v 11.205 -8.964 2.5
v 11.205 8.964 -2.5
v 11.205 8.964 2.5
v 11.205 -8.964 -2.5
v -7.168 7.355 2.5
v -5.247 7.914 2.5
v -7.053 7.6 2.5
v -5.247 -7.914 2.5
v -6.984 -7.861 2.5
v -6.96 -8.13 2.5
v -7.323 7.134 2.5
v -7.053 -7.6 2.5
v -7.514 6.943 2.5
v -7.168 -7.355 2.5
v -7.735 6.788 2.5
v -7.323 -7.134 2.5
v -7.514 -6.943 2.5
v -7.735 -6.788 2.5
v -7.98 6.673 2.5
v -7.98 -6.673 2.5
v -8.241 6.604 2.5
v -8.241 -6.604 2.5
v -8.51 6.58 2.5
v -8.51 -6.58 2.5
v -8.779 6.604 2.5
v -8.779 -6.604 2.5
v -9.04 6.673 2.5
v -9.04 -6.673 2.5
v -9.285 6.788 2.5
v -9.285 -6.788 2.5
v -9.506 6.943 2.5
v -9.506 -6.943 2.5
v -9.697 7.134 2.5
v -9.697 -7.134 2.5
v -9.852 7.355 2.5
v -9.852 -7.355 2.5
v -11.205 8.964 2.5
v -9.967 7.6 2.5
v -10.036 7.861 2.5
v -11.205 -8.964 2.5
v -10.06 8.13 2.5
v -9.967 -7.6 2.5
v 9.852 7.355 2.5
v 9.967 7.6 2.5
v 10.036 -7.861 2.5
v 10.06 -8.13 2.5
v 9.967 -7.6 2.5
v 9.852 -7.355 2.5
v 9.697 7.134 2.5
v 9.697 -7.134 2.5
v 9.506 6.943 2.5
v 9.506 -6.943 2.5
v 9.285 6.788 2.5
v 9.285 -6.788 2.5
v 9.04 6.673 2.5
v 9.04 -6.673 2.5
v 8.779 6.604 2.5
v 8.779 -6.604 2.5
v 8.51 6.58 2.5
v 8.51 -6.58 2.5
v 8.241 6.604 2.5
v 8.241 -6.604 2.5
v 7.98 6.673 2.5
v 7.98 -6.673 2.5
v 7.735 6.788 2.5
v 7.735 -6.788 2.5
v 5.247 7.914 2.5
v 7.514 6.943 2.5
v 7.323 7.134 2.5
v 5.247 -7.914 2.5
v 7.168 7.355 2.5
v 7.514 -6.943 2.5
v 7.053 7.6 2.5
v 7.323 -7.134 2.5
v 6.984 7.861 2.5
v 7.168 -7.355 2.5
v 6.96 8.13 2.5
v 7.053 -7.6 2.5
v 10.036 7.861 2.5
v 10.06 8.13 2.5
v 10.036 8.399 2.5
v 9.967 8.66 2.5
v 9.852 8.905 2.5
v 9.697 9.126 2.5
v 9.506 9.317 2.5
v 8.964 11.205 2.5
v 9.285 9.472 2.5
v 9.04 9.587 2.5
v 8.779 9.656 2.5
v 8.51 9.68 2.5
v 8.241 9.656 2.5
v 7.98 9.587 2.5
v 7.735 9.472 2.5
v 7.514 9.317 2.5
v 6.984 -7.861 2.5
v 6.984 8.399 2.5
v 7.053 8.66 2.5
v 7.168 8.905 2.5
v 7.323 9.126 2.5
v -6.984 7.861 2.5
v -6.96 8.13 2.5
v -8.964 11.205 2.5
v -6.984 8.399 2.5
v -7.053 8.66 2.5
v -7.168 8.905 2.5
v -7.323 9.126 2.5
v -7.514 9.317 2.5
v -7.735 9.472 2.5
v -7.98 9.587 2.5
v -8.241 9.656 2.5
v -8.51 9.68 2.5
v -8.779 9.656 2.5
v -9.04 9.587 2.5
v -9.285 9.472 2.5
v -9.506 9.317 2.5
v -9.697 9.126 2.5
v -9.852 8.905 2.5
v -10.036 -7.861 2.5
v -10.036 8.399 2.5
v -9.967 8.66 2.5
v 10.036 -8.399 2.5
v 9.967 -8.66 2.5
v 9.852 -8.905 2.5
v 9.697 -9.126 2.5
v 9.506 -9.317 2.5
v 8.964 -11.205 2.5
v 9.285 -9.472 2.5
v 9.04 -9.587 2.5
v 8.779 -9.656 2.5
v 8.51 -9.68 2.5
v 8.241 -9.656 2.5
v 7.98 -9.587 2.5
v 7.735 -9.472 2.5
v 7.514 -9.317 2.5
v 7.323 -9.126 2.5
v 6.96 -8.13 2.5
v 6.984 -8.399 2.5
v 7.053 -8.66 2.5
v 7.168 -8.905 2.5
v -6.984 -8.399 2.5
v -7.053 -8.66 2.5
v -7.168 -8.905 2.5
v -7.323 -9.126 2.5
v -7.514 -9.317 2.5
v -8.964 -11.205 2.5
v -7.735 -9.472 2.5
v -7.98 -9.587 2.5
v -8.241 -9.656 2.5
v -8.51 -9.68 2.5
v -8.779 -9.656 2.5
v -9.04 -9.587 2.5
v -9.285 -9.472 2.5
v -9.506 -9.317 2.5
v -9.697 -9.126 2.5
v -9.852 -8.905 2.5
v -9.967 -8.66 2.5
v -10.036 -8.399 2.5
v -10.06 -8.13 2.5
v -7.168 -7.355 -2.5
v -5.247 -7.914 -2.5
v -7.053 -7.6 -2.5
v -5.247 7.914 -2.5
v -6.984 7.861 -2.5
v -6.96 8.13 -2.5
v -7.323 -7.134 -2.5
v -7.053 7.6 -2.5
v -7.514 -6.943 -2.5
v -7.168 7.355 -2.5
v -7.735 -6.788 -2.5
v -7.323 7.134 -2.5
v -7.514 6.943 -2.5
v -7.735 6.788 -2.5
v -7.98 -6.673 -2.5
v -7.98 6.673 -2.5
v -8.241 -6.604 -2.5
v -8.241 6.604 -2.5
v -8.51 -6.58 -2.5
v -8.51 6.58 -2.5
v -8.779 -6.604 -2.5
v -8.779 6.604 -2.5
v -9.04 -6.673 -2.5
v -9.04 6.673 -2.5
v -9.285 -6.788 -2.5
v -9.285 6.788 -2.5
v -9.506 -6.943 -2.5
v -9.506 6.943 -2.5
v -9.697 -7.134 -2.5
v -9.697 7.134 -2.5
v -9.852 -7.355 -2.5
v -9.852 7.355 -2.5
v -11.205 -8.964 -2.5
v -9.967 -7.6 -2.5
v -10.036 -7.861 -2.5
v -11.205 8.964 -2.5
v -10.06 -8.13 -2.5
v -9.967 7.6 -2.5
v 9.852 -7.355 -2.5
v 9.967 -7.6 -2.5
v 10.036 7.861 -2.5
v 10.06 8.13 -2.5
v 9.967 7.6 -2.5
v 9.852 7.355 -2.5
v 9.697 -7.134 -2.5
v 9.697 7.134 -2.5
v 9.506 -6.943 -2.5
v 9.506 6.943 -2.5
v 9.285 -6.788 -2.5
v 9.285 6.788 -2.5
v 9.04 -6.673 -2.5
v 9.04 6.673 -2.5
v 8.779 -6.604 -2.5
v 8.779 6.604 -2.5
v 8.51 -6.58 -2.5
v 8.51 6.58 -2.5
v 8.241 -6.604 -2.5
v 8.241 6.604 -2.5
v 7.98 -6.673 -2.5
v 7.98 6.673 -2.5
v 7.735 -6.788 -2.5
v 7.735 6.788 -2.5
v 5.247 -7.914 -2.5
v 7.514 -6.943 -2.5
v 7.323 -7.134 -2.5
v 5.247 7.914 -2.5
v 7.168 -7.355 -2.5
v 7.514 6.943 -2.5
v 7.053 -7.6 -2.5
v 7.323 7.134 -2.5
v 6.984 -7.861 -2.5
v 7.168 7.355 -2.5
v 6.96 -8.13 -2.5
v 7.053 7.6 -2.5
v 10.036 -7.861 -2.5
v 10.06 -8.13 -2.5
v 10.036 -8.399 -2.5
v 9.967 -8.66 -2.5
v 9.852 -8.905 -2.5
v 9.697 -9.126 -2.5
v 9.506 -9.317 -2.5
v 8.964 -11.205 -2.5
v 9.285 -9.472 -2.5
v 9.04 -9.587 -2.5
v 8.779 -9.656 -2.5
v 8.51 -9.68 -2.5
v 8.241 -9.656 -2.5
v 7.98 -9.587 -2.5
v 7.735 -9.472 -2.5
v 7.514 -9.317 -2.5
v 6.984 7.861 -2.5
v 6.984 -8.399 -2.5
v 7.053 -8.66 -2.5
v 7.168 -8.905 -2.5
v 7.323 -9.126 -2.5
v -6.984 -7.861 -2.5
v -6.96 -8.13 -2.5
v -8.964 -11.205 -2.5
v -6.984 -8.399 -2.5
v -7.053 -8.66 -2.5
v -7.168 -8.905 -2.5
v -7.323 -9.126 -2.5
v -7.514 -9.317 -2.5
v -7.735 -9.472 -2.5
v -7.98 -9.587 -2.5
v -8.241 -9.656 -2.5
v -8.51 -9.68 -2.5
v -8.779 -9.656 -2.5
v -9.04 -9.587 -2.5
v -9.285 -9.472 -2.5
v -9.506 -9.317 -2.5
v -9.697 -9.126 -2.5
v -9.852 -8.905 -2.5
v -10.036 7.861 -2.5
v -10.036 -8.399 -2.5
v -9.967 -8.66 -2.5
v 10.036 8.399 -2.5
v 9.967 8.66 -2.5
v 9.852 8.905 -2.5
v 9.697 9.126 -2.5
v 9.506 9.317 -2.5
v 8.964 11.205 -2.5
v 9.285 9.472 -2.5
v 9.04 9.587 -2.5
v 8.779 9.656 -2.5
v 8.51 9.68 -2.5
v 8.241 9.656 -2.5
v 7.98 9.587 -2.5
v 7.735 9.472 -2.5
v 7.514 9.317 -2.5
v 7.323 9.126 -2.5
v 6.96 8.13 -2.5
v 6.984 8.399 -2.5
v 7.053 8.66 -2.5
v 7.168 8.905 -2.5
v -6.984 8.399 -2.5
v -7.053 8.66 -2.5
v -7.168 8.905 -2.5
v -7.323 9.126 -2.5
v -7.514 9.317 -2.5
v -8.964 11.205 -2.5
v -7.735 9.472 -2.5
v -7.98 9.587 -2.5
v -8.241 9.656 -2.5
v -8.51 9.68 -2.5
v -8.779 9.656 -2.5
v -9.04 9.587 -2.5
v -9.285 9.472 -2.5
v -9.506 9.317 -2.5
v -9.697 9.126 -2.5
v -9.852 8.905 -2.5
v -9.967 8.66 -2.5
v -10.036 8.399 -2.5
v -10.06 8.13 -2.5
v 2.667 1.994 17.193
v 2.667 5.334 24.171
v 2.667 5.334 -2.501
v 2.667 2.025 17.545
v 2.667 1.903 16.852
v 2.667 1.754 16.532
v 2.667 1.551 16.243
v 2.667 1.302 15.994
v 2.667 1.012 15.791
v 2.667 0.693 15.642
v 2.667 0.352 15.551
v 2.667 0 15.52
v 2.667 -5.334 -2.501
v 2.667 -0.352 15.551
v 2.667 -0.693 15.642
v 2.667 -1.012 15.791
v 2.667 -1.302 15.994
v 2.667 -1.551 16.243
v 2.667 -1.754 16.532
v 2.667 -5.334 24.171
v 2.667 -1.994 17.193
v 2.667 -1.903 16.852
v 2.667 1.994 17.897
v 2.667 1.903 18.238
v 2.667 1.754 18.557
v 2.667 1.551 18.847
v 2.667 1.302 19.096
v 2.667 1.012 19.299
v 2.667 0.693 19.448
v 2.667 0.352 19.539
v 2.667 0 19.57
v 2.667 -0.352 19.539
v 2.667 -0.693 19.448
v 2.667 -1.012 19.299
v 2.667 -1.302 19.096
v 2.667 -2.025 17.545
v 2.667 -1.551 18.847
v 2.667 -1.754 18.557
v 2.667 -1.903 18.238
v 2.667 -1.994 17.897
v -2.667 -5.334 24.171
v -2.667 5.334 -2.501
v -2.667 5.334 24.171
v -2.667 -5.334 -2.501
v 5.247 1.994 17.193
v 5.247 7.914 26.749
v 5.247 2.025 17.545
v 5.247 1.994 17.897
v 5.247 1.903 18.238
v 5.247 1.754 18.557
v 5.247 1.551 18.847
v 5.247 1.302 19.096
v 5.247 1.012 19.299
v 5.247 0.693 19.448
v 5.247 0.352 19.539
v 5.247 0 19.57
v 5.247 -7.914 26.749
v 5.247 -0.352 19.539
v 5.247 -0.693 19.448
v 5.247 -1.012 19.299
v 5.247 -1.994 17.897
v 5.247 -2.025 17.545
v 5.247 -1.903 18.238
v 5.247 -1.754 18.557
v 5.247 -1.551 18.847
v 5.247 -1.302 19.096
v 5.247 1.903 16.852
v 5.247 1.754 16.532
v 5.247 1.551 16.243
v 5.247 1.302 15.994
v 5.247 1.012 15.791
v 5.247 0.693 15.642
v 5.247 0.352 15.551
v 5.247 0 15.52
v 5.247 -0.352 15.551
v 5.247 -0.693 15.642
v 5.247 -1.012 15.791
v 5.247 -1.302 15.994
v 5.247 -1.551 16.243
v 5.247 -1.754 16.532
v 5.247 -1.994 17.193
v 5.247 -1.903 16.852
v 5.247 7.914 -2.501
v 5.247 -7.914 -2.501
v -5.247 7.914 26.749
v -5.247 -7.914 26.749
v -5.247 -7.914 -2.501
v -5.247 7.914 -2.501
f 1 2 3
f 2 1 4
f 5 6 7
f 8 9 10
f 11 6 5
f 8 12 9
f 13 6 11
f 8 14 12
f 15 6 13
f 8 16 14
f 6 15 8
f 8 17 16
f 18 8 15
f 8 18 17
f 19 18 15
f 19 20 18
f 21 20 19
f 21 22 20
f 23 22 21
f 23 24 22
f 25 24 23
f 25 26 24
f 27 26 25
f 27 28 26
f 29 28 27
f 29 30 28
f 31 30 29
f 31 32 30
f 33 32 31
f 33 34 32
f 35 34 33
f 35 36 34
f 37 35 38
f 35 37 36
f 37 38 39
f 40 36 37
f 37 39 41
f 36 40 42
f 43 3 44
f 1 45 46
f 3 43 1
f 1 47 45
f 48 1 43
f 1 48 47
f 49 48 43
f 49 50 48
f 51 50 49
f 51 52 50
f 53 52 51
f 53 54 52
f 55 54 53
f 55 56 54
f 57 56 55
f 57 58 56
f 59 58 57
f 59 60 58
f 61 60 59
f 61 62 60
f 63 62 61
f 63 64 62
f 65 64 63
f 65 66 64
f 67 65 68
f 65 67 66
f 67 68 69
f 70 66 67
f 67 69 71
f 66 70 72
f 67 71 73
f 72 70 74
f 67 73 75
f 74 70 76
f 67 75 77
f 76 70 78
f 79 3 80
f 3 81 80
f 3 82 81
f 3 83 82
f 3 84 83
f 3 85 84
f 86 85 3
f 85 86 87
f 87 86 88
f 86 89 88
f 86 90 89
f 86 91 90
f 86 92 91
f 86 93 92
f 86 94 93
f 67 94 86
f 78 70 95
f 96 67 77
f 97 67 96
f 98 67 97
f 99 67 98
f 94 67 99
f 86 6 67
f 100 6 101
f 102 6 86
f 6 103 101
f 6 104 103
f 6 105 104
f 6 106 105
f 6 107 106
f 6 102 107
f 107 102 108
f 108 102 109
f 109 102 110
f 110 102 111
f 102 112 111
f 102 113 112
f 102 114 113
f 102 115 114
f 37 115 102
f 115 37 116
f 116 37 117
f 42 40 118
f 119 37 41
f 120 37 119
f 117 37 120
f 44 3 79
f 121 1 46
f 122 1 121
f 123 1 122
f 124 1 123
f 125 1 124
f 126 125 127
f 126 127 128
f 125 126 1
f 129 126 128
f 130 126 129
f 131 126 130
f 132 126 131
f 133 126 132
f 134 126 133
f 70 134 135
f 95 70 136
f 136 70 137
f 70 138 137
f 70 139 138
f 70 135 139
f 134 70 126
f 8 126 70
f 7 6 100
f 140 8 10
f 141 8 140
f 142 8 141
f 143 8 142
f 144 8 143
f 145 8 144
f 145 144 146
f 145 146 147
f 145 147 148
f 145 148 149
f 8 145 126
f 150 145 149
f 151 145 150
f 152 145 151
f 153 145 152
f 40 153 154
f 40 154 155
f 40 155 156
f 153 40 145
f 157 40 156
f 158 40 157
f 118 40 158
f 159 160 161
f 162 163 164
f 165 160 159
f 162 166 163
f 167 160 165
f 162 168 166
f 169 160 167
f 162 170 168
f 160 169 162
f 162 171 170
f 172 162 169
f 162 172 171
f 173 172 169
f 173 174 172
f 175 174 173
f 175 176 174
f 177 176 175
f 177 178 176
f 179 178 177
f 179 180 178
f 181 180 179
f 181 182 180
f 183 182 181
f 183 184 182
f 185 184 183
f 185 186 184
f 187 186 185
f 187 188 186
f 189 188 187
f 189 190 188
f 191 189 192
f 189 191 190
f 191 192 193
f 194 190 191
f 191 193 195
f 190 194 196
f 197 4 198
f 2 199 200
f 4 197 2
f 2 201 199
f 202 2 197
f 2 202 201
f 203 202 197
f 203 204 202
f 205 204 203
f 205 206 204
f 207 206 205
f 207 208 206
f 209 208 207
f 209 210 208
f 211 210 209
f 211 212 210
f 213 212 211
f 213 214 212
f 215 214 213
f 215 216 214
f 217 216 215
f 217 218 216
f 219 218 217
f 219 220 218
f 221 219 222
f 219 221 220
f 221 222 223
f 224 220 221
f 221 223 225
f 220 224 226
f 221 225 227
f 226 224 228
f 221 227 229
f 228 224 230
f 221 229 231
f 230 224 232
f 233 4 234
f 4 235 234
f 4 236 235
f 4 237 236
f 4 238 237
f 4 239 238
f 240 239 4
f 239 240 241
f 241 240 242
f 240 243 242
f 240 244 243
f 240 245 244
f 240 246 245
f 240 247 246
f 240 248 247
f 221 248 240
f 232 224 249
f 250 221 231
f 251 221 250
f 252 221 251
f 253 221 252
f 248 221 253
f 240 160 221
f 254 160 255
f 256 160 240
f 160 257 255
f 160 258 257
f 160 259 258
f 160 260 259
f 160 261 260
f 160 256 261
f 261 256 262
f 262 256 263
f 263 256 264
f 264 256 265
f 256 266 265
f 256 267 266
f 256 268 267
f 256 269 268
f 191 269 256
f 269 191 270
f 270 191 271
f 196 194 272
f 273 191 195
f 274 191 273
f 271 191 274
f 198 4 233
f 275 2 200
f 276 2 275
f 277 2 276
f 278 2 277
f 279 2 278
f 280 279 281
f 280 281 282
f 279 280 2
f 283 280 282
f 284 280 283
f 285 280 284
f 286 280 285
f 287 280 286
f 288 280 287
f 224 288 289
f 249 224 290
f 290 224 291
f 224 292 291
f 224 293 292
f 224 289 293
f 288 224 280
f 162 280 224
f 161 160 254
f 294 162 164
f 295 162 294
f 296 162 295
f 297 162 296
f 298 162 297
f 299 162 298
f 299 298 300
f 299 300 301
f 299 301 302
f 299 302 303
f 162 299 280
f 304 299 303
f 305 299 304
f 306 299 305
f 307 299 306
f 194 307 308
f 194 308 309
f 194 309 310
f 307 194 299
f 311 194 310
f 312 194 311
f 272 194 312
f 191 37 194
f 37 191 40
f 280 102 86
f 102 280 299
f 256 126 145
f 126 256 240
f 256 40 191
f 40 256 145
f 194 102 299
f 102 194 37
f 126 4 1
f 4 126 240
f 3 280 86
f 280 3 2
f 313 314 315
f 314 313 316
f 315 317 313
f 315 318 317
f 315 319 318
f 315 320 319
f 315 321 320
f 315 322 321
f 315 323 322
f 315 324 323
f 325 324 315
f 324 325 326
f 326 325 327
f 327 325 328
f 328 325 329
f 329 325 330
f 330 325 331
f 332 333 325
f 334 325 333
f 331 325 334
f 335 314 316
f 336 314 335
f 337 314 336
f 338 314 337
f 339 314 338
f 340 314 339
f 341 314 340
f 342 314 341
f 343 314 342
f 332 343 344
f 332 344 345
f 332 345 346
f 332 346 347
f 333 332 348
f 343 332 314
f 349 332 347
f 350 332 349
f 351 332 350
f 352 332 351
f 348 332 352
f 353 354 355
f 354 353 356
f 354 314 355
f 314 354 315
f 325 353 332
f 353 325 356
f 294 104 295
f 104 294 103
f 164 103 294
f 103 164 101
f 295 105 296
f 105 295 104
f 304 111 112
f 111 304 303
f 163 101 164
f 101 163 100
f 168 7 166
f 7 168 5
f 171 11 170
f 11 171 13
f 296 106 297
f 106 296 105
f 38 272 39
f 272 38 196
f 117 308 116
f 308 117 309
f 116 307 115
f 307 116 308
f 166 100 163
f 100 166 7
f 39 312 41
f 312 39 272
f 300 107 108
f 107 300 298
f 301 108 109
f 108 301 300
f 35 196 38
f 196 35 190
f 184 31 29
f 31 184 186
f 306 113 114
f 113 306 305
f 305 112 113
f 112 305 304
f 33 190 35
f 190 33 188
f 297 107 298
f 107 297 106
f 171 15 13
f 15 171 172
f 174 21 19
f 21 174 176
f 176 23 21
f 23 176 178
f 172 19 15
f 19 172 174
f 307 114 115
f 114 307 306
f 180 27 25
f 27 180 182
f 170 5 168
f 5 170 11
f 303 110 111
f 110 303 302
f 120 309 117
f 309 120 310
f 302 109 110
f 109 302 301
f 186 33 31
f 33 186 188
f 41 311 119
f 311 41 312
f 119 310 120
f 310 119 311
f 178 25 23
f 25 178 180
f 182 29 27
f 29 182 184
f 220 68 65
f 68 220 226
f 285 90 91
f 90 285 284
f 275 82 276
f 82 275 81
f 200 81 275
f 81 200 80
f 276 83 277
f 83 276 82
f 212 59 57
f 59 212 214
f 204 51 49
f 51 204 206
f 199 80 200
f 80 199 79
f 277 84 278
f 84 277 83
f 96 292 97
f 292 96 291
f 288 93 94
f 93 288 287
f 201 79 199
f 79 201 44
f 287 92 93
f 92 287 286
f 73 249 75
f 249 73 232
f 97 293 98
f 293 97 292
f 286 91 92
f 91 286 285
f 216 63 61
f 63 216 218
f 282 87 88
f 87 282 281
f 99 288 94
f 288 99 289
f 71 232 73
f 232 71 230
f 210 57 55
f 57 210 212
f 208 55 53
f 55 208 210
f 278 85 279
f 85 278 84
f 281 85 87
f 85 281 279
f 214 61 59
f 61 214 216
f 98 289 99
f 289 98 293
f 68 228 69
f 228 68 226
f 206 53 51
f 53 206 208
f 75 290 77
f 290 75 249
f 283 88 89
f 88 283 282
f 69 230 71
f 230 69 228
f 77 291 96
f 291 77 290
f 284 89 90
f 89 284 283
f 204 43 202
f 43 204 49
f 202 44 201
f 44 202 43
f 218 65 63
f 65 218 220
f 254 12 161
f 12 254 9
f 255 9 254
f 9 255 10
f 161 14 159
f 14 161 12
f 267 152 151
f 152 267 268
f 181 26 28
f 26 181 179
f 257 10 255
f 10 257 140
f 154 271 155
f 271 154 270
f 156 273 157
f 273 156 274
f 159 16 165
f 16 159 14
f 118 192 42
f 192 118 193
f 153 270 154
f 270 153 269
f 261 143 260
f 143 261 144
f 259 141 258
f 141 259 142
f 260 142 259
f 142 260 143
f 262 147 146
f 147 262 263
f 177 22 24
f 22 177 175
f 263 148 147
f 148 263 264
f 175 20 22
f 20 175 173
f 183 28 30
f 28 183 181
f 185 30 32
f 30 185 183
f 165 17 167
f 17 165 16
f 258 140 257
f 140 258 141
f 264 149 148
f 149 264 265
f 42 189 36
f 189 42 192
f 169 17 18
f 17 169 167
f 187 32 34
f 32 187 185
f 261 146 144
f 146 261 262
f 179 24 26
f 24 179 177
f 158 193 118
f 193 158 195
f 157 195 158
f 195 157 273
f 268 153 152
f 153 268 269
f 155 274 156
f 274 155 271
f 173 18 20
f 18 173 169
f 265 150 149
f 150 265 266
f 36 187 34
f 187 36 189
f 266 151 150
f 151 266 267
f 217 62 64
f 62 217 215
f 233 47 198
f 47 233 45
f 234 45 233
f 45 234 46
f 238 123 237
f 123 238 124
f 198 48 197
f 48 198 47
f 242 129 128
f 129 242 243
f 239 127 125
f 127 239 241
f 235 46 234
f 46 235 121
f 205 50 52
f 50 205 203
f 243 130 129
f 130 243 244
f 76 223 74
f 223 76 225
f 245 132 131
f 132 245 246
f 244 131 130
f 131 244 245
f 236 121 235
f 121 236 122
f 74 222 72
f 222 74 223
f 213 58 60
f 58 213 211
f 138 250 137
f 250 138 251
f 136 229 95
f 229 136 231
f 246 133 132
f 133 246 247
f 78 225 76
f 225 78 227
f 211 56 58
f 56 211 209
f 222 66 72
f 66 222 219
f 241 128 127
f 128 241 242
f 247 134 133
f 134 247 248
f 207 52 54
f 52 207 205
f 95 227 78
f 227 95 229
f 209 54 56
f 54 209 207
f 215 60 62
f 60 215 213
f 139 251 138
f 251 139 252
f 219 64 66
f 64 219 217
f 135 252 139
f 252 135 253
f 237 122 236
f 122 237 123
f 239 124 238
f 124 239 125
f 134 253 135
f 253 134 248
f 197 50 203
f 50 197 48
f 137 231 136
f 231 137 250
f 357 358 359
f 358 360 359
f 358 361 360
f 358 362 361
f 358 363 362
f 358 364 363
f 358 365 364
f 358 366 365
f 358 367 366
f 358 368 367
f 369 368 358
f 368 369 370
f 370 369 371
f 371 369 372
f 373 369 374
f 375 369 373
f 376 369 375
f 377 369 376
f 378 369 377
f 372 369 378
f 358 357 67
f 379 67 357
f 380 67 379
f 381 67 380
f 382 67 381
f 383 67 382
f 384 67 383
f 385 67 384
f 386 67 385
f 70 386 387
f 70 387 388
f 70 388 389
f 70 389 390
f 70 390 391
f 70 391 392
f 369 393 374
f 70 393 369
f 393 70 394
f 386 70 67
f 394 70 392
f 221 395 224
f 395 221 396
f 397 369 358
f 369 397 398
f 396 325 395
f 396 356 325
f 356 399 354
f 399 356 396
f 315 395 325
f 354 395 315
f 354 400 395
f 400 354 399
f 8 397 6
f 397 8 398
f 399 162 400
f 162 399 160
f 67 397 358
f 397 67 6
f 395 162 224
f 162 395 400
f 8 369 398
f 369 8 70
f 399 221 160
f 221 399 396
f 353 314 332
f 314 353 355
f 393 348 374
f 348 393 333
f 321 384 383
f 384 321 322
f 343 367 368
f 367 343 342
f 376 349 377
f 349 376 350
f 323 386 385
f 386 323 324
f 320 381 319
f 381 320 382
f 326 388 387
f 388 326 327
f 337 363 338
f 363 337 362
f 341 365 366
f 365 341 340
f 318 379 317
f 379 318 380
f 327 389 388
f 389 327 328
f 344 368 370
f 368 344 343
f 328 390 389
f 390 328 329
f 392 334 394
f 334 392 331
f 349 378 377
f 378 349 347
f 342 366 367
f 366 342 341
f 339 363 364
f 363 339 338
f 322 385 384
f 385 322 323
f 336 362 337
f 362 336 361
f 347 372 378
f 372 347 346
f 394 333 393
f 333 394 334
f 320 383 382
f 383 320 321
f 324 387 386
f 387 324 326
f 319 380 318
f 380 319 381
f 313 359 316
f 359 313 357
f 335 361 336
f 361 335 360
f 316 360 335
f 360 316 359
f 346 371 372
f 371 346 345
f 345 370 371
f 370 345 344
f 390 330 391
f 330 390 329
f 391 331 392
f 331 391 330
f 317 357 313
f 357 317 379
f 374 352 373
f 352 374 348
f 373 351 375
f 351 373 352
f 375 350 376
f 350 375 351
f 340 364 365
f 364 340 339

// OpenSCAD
// *************************************************************
// (C) 2013 Dipl.Ing. Rolf-Dieter Klein, Munich Germany
// OpenSource -- would be great to keep my name as reference
// www.rdklein.de
// report error, problems to rdklein@rdklein.de
// *************************************************************
// WR Flange Code 
wrcode = 6; // [1:WR112,2:WR90,3:WR75,4:WR62,5:WR51,6:WR42,7:WR34,8:WR28]
//
// Diameter of Coax Adapter (in mm)
coaxsize = 4.05;  // SMA Adapter dielectric diameter
//
// overall wall thickness in mm
wall = 2.58; // also thickness of SMA Adapter dielectric to contact
// flange thickness
flanged = 5; // flange thickness
// add length *lambda/2
addlen = 1;
// standard dimension tables
// WR cannot be entered directly due to openscad variable restrictions
// a case of if for assignment cannot be used, index is easier for this.
// WR 112 7.05-10.00 GHz
// WR 90  8.20-12.40 GHz
// WR 75  10.00-15.00 GHz
// WR 62  12.49-18.00 GHz
// WR 51  15.00-22.00 GHz
// WR 42  18.00-26.50 GHz
// WR 34  22.00-33.00 GHz
// WR 28  26.50-40.00 GHz
//
// do not change:
wrtab = [0,112,90,75,62,51,42,34,28]*1.0;
// do not change:
atab = [0,47.9,41.4,38.3,33.3,31.0,22.41,22.1,19.05]*1.0;
// do not change:
etab = [0,18.72,16.26,14.25,12.14,11.25,8.51,7.9,6.73]*1.0;
// do not change:
ftab = [0,17.17,15.49,13.21,12.63,10.29,8.13,7.5,6.34]*1.0;
// do not change:
drilltab=[0,4.3,4.3,4.1,4.1,4.1,3.1,3.1,3.0]*1.0;
// dann werte zuweisen
// ueber index
sizea = atab[wrcode]; // square size of flange
sizee = etab[wrcode]; // holes from smaller 
sizef = ftab[wrcode]; // holes from larger 
drill = drilltab[wrcode]/2.0; // drill for flange mounting
wr = wrtab[wrcode];
lquat = wr/20.0*2.54; // lamba 4 in mm
// faces for precision
$fn=36; // faces for precision
//
// *********** FLANGE ****************
// Draw A Flange with mounting holes
//
difference() {
 difference() {
 	intersection() {

		cube([sizea,sizea,flanged],center=true);
		rotate([0,0,45]) cube([sizea*1.4142*0.9,sizea*1.4142*0.9,flanged],center=true);
	}
	cube([lquat,lquat*2,flanged*2],center=true);
 } 
 translate([-sizee,sizef,0]) cylinder(h=flanged*2,r=drill,center=true);
 translate([sizee,sizef,0]) cylinder(h=flanged*2,r=drill,center=true);
 translate([-sizee,-sizef,0]) cylinder(h=flanged*2,r=drill,center=true);
 translate([sizee,-sizef,0]) cylinder(h=flanged*2,r=drill,center=true);
}
//
// ***** Transisition adapater *****
// designed for simple hole using a coax cable; Sma etc.
// with no mounting holes 
// tuning screws also omitted (due to inperfection of 3d prints anyway...)
offsetbool = 0.001;
translate([0,0,lquat*3/2+wall/2-offsetbool-flanged/2+addlen*lquat]) difference() {
 difference() {
	translate([0,0,0]) cube([lquat+wall*2,lquat*2+wall*2,lquat*3+addlen*lquat*2+wall*1],center=true);
	translate([0,0,-wall/2-offsetbool]) cube([lquat,lquat*2,lquat*(3+offsetbool)+addlen*lquat*2],center=true);
 }

 // drill hole for coax, position lamba/4 of waveguide from end size
 // waveguide here 3*l/4
 translate([lquat/2+wall/2,0,lquat/2+addlen*lquat-wall]) rotate ([0,90,0]) cylinder(h=wall*2,r=coaxsize/2,center=true);
}
//

 
